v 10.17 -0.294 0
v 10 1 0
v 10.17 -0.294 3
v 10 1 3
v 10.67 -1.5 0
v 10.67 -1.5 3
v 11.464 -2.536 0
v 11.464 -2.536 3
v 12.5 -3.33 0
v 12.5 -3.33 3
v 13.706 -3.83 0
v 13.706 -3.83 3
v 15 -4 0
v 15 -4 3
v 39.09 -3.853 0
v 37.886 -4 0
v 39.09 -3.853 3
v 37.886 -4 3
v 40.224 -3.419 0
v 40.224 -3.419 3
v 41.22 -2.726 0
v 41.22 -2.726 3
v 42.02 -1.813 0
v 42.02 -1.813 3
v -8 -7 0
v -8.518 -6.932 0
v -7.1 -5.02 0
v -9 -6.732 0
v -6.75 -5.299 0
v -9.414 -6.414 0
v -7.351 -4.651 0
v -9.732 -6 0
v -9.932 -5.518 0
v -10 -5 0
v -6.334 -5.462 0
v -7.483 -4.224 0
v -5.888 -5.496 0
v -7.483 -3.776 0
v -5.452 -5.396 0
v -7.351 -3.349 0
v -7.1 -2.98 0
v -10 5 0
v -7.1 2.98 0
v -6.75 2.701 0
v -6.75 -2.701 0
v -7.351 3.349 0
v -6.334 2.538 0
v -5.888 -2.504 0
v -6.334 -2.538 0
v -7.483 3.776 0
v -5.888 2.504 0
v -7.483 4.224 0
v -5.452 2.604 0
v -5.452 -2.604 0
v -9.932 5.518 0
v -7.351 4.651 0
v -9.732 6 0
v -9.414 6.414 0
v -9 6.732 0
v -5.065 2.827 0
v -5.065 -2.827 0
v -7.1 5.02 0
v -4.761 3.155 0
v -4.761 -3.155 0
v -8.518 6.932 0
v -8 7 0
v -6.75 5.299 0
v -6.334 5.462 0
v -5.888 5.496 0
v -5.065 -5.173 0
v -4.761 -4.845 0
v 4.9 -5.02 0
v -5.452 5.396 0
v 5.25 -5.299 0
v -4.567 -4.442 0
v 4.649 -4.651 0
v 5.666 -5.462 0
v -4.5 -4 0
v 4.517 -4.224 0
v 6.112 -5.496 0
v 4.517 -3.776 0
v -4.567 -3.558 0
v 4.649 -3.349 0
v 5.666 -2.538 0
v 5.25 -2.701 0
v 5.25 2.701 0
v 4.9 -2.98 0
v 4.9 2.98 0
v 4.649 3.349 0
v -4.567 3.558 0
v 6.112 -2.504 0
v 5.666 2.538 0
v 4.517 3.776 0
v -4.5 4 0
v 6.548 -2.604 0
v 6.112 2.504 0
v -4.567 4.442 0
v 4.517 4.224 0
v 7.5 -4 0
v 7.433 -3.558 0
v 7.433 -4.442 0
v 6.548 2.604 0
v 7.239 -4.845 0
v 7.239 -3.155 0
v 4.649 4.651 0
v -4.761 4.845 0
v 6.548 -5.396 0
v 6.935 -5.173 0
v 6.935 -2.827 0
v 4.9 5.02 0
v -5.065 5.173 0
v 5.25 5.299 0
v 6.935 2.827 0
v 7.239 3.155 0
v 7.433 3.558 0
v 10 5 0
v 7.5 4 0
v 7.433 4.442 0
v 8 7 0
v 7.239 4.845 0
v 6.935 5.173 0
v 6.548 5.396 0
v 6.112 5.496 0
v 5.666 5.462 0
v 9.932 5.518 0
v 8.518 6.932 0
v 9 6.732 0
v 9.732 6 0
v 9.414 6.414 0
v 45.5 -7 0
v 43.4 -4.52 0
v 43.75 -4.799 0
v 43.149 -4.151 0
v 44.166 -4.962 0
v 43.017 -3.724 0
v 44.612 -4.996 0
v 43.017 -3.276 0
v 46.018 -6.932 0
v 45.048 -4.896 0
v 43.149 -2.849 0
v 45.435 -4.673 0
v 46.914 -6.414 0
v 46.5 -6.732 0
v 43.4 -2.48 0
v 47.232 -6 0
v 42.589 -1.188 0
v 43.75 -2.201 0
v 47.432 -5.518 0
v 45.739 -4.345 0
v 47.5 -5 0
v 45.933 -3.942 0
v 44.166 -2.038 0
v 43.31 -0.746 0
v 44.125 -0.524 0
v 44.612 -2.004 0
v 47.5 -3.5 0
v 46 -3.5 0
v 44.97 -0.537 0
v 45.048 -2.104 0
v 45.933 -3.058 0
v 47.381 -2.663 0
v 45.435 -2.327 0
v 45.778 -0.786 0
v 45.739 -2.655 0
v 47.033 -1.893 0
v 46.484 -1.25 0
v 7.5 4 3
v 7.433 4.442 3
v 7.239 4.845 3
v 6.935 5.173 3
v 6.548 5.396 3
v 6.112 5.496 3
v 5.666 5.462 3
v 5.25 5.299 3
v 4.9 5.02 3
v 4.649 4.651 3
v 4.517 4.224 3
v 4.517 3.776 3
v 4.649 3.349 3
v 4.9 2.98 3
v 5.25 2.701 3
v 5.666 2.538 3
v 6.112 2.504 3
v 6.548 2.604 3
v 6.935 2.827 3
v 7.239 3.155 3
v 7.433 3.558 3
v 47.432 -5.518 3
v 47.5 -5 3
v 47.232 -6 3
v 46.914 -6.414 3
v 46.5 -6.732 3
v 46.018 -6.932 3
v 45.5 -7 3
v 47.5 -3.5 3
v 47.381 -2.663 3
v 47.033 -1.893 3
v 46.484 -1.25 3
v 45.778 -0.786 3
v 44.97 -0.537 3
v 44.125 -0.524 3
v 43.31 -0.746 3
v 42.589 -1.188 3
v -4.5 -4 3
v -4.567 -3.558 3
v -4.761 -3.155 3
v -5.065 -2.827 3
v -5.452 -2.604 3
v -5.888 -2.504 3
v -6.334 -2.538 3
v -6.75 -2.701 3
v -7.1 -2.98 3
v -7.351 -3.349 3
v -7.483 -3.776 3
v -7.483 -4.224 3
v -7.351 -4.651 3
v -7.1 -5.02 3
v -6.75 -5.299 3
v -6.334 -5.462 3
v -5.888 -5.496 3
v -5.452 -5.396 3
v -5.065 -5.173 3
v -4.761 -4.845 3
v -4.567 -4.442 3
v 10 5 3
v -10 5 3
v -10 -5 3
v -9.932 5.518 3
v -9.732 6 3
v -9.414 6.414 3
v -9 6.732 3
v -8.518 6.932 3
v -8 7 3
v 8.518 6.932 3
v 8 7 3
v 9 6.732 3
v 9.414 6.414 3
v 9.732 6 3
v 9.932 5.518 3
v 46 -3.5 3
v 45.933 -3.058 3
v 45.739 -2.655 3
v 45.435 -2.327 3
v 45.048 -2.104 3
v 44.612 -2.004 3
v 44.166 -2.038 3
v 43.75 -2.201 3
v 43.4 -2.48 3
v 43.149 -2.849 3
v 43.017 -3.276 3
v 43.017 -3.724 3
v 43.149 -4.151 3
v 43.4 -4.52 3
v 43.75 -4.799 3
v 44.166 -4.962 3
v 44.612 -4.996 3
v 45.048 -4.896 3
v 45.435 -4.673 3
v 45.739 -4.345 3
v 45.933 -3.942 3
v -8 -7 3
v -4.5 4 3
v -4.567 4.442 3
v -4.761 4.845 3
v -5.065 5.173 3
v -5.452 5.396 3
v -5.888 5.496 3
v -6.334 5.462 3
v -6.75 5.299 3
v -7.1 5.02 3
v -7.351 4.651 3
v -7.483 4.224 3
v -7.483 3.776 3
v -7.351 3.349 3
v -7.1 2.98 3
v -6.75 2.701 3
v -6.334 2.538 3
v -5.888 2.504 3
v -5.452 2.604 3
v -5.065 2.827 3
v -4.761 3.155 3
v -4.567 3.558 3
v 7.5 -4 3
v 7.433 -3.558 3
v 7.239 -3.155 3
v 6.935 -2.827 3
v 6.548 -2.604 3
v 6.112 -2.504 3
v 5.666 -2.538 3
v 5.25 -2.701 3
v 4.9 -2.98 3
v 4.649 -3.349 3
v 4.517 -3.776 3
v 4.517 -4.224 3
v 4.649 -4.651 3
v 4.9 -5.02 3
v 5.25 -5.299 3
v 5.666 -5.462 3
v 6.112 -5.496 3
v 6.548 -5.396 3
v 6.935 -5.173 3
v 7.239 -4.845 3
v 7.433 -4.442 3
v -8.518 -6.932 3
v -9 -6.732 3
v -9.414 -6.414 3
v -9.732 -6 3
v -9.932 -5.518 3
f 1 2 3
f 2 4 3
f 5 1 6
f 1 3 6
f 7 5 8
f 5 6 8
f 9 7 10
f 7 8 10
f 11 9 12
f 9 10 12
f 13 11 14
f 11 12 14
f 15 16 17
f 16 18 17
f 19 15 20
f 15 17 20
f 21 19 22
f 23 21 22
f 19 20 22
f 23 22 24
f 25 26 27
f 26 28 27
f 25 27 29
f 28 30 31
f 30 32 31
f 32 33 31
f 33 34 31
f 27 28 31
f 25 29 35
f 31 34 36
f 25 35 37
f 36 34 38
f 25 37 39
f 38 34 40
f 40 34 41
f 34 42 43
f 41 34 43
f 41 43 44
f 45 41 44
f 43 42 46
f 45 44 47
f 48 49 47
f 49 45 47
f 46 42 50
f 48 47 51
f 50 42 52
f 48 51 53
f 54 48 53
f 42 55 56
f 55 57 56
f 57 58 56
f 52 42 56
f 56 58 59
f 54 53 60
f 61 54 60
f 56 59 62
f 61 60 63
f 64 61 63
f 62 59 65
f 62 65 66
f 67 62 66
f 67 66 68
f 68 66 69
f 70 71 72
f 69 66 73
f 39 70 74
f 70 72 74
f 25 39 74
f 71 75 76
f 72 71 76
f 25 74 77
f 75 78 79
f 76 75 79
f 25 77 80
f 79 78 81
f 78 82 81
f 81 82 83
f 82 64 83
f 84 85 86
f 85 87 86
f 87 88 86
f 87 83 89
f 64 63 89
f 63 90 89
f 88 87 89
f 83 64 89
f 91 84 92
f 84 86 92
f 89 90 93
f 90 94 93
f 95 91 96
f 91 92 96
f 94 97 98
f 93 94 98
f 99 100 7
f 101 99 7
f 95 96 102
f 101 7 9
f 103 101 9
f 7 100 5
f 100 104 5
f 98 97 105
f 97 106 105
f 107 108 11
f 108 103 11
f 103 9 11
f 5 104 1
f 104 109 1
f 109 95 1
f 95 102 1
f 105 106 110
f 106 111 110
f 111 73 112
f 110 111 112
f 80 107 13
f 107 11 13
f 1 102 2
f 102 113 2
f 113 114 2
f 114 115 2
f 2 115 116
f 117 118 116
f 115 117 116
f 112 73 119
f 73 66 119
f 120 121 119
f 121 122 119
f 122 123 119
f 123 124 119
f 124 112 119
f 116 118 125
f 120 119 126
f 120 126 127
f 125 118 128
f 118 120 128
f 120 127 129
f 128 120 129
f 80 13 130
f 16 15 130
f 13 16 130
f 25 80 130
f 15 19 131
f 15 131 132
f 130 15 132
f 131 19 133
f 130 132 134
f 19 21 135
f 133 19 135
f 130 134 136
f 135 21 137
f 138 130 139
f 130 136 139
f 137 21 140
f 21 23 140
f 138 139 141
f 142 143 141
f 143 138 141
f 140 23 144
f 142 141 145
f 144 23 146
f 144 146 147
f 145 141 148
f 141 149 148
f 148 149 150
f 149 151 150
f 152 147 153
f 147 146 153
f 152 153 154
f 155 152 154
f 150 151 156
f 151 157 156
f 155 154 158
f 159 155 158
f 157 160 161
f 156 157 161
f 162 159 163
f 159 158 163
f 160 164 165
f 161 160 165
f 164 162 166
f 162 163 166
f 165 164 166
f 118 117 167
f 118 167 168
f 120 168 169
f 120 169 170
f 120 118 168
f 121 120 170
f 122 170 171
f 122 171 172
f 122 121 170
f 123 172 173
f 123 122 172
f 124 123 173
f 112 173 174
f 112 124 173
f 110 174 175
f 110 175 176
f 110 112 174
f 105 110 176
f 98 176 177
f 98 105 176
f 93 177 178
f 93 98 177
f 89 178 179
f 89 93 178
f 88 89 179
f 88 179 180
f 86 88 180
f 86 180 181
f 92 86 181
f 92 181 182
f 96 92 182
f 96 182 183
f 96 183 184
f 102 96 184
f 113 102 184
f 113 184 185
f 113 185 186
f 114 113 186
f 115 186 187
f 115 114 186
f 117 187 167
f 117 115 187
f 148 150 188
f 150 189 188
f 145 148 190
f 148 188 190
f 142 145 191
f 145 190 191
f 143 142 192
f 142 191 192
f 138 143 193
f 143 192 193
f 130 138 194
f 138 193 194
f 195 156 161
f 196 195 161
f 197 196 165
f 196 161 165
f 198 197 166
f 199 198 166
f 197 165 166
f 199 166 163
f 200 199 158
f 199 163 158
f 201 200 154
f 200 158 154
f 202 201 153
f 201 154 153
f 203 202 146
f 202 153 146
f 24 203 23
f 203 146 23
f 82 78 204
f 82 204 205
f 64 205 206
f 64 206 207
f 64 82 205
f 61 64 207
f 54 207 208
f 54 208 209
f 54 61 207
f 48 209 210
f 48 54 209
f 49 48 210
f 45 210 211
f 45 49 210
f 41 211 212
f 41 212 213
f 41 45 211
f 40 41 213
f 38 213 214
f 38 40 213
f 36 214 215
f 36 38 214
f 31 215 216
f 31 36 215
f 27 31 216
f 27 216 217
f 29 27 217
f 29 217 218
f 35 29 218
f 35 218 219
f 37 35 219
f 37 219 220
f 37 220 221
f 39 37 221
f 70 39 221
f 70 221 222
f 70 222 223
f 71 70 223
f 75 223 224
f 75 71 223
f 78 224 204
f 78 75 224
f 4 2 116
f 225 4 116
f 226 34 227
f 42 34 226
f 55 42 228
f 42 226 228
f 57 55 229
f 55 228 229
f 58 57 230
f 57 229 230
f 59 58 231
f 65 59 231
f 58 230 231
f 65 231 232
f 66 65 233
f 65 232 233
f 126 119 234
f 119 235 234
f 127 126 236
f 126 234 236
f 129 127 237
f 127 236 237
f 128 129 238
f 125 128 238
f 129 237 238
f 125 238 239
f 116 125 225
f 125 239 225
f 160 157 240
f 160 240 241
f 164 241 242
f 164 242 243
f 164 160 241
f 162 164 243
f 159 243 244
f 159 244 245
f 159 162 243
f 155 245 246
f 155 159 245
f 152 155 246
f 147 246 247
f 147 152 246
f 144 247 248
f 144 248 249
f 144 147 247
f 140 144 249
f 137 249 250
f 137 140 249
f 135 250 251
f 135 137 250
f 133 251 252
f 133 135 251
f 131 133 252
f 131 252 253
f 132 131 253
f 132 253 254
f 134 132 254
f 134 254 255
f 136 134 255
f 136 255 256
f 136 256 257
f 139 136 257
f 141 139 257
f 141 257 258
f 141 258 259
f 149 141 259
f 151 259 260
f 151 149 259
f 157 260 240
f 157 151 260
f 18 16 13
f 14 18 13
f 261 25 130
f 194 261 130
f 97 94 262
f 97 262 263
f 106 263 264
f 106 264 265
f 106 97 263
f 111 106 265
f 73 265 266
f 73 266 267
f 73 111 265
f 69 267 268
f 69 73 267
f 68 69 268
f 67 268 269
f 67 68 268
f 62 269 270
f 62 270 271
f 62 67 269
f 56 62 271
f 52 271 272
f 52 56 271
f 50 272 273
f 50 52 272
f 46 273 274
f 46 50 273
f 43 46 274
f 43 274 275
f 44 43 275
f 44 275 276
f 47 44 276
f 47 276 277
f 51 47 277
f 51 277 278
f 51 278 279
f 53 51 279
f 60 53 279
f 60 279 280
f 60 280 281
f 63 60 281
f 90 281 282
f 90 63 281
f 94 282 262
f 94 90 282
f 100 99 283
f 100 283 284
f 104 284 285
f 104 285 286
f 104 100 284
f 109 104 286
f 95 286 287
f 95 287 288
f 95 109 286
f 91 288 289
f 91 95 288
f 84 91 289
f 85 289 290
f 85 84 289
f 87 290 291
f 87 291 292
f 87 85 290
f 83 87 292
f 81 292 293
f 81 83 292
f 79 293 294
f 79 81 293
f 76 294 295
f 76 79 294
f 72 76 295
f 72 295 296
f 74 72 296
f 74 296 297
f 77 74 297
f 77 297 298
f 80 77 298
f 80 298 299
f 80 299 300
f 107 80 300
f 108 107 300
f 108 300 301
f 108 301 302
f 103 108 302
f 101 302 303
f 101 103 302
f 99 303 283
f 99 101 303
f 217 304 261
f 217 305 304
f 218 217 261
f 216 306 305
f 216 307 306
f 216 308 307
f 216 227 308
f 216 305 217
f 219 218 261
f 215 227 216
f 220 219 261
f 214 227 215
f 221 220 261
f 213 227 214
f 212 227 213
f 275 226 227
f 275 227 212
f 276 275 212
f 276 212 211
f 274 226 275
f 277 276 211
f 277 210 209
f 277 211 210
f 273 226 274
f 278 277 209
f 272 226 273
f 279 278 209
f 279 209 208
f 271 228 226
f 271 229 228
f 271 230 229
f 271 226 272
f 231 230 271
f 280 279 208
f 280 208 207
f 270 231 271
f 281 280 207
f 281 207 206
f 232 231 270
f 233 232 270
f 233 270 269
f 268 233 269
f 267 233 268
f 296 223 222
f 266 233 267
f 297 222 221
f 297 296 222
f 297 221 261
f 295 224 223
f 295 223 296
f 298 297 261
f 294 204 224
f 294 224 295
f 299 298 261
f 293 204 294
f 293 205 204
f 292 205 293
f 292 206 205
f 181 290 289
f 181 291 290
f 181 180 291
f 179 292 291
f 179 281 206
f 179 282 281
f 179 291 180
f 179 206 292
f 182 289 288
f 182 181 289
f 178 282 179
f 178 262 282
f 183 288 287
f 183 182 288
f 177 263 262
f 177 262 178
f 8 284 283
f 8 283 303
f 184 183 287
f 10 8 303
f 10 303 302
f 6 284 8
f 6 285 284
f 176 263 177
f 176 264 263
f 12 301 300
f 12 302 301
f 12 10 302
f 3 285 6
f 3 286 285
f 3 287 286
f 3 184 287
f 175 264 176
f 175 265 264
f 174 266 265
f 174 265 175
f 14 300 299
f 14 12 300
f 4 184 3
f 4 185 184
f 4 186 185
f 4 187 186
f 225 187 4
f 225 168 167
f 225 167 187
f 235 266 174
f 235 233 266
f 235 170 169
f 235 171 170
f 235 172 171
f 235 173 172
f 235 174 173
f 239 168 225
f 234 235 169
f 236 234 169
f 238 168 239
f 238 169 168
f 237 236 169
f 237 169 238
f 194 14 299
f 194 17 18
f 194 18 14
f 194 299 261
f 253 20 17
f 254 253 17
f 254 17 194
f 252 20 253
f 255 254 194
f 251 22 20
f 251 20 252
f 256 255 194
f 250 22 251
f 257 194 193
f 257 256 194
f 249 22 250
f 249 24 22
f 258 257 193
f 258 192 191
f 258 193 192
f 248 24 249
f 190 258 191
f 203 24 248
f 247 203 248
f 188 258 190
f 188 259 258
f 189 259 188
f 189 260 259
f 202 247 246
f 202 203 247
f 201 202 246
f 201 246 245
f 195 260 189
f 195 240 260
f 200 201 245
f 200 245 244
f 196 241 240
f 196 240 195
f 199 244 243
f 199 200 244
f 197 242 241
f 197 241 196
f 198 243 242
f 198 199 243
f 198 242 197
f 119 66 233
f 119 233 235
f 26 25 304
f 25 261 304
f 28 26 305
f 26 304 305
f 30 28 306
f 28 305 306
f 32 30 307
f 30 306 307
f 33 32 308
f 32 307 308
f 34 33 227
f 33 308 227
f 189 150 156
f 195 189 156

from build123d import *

# Parameters (mm, degrees)
SZKIC1_W                    = 20
SZKIC1_H                    = 14
SZKIC1_R                    = 1.5
DODANIE_WYCI_GNI_CIE1_DEPTH = 3
ZAOKR_GLENIE5_R             = 2
ZAOKR_GLENIE6_R             = 5


with BuildPart() as part:
    # Szkic1 → Dodanie-wyciągnięcie1 (new body)
    # profile 1 of 2: a face of its own
    with BuildSketch(Plane.XY):
        Rectangle(SZKIC1_W, SZKIC1_H)
        with Locations((-6, -4)):
            Circle(SZKIC1_R, mode=Mode.SUBTRACT)
        with Locations((6, -4)):
            Circle(SZKIC1_R, mode=Mode.SUBTRACT)
        with Locations((6, 4)):
            Circle(SZKIC1_R, mode=Mode.SUBTRACT)
        with Locations((-6, 4)):
            Circle(SZKIC1_R, mode=Mode.SUBTRACT)
    # profile 2 of 2: a face of its own
    with BuildSketch(Plane.XY):
        with BuildLine():
            Line((10, -4), (10, -7))
            Line((10, -7), (47.5, -7))
            Line((47.5, -7), (47.5, -3.5))
            ThreePointArc((47.5, -3.5), (44.249121219, -0.510508432), (41.541960108, -4))
            Line((41.541960108, -4), (10, -4))
        make_face()
        with Locations((44.5, -3.5)):
            Circle(SZKIC1_R, mode=Mode.SUBTRACT)
    extrude(amount=DODANIE_WYCI_GNI_CIE1_DEPTH)

    # Zaokrąglenie5
    zaokr_glenie5_edges = [part.edges().sort_by_distance(p)[0] for p in [
        (-10, 7, 1.5),
        (10, 7, 1.5),
        (47.5, -7, 1.5),
        (-10, -7, 1.5),
    ]]
    fillet(zaokr_glenie5_edges, radius=ZAOKR_GLENIE5_R)

    # Zaokrąglenie6
    zaokr_glenie6_edges = [part.edges().sort_by_distance(p)[0] for p in [
        (10, -4, 1.5),
        (41.541960108, -4, 1.5),
    ]]
    fillet(zaokr_glenie6_edges, radius=ZAOKR_GLENIE6_R)


solid = part.part
